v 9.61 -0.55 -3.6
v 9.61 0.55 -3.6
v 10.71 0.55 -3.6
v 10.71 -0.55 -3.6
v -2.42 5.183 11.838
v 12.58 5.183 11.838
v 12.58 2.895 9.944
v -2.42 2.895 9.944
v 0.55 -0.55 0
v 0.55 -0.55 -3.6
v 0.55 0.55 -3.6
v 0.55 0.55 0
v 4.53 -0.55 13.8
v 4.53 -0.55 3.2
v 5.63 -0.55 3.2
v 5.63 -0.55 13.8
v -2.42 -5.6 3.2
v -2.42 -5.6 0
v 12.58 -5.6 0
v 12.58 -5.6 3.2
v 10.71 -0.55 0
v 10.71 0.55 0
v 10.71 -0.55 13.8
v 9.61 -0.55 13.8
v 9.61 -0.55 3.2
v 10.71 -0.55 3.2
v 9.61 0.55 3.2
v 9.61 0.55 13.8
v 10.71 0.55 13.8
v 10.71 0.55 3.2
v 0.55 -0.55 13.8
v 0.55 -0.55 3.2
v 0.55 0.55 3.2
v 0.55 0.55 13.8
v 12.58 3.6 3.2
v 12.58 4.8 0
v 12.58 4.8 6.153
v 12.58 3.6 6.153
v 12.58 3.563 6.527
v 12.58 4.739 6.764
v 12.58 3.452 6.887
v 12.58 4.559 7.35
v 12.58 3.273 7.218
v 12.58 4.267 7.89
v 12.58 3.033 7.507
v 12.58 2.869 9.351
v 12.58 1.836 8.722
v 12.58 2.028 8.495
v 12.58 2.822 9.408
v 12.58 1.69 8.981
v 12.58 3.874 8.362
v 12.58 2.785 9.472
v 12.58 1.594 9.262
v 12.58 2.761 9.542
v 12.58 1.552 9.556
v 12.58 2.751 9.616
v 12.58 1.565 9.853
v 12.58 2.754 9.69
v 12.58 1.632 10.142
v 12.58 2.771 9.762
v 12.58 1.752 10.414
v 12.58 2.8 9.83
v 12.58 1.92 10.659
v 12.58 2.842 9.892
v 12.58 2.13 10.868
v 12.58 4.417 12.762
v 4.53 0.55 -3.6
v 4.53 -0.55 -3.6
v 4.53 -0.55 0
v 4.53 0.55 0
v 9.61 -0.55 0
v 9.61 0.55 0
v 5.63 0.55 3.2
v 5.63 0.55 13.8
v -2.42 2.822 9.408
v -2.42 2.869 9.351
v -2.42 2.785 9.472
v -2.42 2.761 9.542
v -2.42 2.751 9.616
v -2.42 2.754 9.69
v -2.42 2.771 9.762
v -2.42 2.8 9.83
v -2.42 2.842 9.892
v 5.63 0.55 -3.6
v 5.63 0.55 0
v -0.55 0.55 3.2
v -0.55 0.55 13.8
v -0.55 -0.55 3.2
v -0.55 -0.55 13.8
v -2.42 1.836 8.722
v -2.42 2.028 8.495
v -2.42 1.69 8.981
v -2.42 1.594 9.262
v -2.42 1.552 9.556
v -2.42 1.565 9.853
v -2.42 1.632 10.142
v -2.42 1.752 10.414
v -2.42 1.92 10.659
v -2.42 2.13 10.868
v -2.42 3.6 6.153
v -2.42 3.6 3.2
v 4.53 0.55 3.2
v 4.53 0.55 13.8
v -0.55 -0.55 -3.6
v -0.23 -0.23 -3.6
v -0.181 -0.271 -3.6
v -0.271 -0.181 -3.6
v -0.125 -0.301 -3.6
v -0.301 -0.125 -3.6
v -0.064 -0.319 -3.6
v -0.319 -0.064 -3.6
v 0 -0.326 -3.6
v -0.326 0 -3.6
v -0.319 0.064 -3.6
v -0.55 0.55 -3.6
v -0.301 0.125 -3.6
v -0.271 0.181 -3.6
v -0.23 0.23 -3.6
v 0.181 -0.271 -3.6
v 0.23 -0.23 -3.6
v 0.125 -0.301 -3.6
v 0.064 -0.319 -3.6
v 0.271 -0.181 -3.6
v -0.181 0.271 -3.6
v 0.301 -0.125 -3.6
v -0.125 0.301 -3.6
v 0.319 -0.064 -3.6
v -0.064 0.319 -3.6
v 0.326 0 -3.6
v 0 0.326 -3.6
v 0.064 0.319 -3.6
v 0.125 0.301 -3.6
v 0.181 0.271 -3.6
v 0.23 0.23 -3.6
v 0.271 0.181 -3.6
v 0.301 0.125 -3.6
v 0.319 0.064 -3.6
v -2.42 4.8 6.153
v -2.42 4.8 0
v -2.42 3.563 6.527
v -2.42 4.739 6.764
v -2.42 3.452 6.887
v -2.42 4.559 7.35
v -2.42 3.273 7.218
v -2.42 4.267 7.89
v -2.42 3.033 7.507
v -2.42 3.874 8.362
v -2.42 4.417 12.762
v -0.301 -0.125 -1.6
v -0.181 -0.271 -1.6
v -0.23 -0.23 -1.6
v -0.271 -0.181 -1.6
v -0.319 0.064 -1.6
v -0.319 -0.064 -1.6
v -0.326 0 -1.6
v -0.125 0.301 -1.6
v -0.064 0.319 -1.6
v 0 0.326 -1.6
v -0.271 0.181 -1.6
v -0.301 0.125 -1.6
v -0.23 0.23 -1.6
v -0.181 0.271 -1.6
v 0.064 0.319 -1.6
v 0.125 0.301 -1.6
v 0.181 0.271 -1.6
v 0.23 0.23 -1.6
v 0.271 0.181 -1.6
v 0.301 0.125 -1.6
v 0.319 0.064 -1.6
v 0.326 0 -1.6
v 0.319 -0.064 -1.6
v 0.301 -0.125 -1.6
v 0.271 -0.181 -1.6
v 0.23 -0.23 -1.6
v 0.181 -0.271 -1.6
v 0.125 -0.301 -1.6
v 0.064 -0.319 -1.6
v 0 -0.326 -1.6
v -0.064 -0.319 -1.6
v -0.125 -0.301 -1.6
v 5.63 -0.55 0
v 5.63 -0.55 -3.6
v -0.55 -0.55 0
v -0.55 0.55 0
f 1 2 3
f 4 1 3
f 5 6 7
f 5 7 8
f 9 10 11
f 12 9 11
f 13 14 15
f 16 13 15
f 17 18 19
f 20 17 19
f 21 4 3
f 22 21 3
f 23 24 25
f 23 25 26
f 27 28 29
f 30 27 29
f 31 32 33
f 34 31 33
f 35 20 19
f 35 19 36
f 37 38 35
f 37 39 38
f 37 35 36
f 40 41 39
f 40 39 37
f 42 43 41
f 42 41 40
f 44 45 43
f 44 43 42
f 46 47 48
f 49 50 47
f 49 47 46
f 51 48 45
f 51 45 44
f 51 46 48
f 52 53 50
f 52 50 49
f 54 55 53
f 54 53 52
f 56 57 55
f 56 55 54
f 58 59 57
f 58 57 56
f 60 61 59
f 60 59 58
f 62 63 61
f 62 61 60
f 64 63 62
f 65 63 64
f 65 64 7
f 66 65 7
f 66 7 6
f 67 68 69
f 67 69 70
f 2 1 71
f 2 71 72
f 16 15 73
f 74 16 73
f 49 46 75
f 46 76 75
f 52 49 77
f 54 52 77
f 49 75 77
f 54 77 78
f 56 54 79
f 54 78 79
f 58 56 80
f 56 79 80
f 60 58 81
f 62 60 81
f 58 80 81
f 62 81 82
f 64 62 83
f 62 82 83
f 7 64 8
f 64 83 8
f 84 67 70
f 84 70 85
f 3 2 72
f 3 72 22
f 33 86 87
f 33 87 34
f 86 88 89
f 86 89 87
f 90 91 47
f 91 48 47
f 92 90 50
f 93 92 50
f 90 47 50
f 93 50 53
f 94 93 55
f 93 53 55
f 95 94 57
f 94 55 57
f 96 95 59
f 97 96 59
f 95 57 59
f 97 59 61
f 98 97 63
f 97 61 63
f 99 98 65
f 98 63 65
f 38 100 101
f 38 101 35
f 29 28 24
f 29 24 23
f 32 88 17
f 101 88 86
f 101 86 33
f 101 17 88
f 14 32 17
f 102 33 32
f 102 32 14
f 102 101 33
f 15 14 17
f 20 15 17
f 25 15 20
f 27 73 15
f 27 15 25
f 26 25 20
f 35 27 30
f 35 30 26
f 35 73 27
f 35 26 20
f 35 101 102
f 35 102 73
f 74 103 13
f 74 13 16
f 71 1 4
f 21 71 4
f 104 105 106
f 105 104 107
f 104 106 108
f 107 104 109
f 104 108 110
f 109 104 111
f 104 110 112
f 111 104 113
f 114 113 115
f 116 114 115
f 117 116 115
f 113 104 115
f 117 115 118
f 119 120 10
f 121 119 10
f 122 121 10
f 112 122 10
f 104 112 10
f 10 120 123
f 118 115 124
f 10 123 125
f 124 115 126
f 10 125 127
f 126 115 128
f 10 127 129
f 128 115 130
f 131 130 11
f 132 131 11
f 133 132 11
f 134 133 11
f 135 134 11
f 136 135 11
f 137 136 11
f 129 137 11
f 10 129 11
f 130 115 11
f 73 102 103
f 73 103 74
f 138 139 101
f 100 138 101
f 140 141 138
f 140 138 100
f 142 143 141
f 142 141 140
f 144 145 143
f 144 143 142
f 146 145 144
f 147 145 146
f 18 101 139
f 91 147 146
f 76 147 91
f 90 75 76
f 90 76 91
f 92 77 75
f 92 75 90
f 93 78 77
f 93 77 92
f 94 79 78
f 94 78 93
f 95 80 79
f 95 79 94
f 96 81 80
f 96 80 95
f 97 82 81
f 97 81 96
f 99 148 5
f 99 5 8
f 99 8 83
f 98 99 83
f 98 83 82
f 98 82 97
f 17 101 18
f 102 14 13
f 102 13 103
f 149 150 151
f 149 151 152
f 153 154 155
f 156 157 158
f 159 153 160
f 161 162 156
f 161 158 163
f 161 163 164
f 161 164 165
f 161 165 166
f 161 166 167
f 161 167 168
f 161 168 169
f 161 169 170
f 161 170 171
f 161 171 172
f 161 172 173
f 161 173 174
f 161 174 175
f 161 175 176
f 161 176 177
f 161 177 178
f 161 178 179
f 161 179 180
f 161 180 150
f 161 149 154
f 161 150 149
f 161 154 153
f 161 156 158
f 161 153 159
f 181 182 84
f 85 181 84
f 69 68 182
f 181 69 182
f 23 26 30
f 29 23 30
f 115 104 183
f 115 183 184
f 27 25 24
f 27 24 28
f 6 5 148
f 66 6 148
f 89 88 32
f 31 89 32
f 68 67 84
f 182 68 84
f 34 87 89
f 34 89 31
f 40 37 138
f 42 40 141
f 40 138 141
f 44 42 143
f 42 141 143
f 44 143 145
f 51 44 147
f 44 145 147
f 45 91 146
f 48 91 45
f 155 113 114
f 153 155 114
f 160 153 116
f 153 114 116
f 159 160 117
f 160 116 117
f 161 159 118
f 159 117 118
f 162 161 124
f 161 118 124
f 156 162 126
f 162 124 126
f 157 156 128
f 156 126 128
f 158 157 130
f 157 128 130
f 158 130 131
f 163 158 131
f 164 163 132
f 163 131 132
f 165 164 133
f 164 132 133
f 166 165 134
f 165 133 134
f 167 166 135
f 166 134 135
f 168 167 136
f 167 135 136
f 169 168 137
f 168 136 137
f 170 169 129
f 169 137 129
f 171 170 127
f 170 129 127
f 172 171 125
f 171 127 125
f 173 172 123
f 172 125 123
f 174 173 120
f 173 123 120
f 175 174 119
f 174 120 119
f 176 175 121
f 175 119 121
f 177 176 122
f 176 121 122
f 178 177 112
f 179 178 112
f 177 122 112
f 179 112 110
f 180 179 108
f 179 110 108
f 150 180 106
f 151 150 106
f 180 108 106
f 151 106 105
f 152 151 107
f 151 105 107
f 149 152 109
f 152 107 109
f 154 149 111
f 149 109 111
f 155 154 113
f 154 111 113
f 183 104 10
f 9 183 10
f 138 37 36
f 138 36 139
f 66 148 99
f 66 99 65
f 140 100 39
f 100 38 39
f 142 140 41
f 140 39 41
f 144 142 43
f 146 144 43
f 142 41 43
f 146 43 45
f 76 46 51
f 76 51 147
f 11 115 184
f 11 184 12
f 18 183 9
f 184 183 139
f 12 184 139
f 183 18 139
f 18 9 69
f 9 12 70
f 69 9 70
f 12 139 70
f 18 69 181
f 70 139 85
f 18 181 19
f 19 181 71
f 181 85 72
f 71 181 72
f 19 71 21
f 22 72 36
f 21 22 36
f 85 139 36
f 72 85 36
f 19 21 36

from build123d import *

# Parameters (mm, degrees)
SKETCH_2_W           = 15
SKETCH_2_H           = 10.4
EXTRUDE_1_DEPTH      = 3.2
EXTRUDE_2_DEPTH      = 13.8
EXTRUDE_2_DEPTH_BACK = 3.6
SKETCH_3_W           = 1.1
SKETCH_3_H           = 1.1
SKETCH_5_W           = 15
SKETCH_5_H           = 1.2
SKETCH_6_R           = 0.325501749
CUT_EXTRUDE_1_DEPTH  = 2


with BuildPart() as part:
    # Эскиз2 → Вытянуть1 (new body)
    with BuildSketch(Plane.XY):
        with Locations((5.08, -0.4)):
            Rectangle(SKETCH_2_W, SKETCH_2_H)
    extrude(amount=EXTRUDE_1_DEPTH)

    # Эскиз3 → Вытянуть2 (add, two sides: drawn at the far end of the back side and taken through both)
    with BuildSketch(Plane.XY.offset(-EXTRUDE_2_DEPTH_BACK)):
        Rectangle(SKETCH_3_W, SKETCH_3_H)
        with Locations((5.08, 0)):
            Rectangle(SKETCH_3_W, SKETCH_3_H)
        with Locations((10.16, 0)):
            Rectangle(SKETCH_3_W, SKETCH_3_H)
    extrude(amount=EXTRUDE_2_DEPTH + EXTRUDE_2_DEPTH_BACK)

    # По траектории1: sweep along a path in Эскиз4
    with BuildLine(Plane.ZY.offset(2.42)) as sweep_1_path:
        Line((3.2, 4.2), (6.152565934, 4.2))
        ThreePointArc((6.152565934, 4.2), (7.118635036, 4.005799317), (7.934615114, 3.453368392))
        Line((7.934615114, 3.453368392), (8.923160693, 2.448652643))
        ThreePointArc((8.923160693, 2.448652643), (9.678881269, 2.150920668), (10.406297634, 2.512339193))
        Line((10.406297634, 2.512339193), (12.3, 4.8))
    # Эскиз5 → По траектории1 (sweep)
    with BuildSketch(Plane.XY.offset(3.2)):
        with Locations((5.08, 4.2)):
            Rectangle(SKETCH_5_W, SKETCH_5_H)
    sweep(path=sweep_1_path.line)

    # Эскиз6 → Вырез-Вытянуть1 (cut)
    with BuildSketch(Plane(origin=(0, 0, -3.6), x_dir=(-1, 0, 0), z_dir=(0, 0, -1))):
        Circle(SKETCH_6_R)
    extrude(amount=-CUT_EXTRUDE_1_DEPTH, mode=Mode.SUBTRACT)


solid = part.part
